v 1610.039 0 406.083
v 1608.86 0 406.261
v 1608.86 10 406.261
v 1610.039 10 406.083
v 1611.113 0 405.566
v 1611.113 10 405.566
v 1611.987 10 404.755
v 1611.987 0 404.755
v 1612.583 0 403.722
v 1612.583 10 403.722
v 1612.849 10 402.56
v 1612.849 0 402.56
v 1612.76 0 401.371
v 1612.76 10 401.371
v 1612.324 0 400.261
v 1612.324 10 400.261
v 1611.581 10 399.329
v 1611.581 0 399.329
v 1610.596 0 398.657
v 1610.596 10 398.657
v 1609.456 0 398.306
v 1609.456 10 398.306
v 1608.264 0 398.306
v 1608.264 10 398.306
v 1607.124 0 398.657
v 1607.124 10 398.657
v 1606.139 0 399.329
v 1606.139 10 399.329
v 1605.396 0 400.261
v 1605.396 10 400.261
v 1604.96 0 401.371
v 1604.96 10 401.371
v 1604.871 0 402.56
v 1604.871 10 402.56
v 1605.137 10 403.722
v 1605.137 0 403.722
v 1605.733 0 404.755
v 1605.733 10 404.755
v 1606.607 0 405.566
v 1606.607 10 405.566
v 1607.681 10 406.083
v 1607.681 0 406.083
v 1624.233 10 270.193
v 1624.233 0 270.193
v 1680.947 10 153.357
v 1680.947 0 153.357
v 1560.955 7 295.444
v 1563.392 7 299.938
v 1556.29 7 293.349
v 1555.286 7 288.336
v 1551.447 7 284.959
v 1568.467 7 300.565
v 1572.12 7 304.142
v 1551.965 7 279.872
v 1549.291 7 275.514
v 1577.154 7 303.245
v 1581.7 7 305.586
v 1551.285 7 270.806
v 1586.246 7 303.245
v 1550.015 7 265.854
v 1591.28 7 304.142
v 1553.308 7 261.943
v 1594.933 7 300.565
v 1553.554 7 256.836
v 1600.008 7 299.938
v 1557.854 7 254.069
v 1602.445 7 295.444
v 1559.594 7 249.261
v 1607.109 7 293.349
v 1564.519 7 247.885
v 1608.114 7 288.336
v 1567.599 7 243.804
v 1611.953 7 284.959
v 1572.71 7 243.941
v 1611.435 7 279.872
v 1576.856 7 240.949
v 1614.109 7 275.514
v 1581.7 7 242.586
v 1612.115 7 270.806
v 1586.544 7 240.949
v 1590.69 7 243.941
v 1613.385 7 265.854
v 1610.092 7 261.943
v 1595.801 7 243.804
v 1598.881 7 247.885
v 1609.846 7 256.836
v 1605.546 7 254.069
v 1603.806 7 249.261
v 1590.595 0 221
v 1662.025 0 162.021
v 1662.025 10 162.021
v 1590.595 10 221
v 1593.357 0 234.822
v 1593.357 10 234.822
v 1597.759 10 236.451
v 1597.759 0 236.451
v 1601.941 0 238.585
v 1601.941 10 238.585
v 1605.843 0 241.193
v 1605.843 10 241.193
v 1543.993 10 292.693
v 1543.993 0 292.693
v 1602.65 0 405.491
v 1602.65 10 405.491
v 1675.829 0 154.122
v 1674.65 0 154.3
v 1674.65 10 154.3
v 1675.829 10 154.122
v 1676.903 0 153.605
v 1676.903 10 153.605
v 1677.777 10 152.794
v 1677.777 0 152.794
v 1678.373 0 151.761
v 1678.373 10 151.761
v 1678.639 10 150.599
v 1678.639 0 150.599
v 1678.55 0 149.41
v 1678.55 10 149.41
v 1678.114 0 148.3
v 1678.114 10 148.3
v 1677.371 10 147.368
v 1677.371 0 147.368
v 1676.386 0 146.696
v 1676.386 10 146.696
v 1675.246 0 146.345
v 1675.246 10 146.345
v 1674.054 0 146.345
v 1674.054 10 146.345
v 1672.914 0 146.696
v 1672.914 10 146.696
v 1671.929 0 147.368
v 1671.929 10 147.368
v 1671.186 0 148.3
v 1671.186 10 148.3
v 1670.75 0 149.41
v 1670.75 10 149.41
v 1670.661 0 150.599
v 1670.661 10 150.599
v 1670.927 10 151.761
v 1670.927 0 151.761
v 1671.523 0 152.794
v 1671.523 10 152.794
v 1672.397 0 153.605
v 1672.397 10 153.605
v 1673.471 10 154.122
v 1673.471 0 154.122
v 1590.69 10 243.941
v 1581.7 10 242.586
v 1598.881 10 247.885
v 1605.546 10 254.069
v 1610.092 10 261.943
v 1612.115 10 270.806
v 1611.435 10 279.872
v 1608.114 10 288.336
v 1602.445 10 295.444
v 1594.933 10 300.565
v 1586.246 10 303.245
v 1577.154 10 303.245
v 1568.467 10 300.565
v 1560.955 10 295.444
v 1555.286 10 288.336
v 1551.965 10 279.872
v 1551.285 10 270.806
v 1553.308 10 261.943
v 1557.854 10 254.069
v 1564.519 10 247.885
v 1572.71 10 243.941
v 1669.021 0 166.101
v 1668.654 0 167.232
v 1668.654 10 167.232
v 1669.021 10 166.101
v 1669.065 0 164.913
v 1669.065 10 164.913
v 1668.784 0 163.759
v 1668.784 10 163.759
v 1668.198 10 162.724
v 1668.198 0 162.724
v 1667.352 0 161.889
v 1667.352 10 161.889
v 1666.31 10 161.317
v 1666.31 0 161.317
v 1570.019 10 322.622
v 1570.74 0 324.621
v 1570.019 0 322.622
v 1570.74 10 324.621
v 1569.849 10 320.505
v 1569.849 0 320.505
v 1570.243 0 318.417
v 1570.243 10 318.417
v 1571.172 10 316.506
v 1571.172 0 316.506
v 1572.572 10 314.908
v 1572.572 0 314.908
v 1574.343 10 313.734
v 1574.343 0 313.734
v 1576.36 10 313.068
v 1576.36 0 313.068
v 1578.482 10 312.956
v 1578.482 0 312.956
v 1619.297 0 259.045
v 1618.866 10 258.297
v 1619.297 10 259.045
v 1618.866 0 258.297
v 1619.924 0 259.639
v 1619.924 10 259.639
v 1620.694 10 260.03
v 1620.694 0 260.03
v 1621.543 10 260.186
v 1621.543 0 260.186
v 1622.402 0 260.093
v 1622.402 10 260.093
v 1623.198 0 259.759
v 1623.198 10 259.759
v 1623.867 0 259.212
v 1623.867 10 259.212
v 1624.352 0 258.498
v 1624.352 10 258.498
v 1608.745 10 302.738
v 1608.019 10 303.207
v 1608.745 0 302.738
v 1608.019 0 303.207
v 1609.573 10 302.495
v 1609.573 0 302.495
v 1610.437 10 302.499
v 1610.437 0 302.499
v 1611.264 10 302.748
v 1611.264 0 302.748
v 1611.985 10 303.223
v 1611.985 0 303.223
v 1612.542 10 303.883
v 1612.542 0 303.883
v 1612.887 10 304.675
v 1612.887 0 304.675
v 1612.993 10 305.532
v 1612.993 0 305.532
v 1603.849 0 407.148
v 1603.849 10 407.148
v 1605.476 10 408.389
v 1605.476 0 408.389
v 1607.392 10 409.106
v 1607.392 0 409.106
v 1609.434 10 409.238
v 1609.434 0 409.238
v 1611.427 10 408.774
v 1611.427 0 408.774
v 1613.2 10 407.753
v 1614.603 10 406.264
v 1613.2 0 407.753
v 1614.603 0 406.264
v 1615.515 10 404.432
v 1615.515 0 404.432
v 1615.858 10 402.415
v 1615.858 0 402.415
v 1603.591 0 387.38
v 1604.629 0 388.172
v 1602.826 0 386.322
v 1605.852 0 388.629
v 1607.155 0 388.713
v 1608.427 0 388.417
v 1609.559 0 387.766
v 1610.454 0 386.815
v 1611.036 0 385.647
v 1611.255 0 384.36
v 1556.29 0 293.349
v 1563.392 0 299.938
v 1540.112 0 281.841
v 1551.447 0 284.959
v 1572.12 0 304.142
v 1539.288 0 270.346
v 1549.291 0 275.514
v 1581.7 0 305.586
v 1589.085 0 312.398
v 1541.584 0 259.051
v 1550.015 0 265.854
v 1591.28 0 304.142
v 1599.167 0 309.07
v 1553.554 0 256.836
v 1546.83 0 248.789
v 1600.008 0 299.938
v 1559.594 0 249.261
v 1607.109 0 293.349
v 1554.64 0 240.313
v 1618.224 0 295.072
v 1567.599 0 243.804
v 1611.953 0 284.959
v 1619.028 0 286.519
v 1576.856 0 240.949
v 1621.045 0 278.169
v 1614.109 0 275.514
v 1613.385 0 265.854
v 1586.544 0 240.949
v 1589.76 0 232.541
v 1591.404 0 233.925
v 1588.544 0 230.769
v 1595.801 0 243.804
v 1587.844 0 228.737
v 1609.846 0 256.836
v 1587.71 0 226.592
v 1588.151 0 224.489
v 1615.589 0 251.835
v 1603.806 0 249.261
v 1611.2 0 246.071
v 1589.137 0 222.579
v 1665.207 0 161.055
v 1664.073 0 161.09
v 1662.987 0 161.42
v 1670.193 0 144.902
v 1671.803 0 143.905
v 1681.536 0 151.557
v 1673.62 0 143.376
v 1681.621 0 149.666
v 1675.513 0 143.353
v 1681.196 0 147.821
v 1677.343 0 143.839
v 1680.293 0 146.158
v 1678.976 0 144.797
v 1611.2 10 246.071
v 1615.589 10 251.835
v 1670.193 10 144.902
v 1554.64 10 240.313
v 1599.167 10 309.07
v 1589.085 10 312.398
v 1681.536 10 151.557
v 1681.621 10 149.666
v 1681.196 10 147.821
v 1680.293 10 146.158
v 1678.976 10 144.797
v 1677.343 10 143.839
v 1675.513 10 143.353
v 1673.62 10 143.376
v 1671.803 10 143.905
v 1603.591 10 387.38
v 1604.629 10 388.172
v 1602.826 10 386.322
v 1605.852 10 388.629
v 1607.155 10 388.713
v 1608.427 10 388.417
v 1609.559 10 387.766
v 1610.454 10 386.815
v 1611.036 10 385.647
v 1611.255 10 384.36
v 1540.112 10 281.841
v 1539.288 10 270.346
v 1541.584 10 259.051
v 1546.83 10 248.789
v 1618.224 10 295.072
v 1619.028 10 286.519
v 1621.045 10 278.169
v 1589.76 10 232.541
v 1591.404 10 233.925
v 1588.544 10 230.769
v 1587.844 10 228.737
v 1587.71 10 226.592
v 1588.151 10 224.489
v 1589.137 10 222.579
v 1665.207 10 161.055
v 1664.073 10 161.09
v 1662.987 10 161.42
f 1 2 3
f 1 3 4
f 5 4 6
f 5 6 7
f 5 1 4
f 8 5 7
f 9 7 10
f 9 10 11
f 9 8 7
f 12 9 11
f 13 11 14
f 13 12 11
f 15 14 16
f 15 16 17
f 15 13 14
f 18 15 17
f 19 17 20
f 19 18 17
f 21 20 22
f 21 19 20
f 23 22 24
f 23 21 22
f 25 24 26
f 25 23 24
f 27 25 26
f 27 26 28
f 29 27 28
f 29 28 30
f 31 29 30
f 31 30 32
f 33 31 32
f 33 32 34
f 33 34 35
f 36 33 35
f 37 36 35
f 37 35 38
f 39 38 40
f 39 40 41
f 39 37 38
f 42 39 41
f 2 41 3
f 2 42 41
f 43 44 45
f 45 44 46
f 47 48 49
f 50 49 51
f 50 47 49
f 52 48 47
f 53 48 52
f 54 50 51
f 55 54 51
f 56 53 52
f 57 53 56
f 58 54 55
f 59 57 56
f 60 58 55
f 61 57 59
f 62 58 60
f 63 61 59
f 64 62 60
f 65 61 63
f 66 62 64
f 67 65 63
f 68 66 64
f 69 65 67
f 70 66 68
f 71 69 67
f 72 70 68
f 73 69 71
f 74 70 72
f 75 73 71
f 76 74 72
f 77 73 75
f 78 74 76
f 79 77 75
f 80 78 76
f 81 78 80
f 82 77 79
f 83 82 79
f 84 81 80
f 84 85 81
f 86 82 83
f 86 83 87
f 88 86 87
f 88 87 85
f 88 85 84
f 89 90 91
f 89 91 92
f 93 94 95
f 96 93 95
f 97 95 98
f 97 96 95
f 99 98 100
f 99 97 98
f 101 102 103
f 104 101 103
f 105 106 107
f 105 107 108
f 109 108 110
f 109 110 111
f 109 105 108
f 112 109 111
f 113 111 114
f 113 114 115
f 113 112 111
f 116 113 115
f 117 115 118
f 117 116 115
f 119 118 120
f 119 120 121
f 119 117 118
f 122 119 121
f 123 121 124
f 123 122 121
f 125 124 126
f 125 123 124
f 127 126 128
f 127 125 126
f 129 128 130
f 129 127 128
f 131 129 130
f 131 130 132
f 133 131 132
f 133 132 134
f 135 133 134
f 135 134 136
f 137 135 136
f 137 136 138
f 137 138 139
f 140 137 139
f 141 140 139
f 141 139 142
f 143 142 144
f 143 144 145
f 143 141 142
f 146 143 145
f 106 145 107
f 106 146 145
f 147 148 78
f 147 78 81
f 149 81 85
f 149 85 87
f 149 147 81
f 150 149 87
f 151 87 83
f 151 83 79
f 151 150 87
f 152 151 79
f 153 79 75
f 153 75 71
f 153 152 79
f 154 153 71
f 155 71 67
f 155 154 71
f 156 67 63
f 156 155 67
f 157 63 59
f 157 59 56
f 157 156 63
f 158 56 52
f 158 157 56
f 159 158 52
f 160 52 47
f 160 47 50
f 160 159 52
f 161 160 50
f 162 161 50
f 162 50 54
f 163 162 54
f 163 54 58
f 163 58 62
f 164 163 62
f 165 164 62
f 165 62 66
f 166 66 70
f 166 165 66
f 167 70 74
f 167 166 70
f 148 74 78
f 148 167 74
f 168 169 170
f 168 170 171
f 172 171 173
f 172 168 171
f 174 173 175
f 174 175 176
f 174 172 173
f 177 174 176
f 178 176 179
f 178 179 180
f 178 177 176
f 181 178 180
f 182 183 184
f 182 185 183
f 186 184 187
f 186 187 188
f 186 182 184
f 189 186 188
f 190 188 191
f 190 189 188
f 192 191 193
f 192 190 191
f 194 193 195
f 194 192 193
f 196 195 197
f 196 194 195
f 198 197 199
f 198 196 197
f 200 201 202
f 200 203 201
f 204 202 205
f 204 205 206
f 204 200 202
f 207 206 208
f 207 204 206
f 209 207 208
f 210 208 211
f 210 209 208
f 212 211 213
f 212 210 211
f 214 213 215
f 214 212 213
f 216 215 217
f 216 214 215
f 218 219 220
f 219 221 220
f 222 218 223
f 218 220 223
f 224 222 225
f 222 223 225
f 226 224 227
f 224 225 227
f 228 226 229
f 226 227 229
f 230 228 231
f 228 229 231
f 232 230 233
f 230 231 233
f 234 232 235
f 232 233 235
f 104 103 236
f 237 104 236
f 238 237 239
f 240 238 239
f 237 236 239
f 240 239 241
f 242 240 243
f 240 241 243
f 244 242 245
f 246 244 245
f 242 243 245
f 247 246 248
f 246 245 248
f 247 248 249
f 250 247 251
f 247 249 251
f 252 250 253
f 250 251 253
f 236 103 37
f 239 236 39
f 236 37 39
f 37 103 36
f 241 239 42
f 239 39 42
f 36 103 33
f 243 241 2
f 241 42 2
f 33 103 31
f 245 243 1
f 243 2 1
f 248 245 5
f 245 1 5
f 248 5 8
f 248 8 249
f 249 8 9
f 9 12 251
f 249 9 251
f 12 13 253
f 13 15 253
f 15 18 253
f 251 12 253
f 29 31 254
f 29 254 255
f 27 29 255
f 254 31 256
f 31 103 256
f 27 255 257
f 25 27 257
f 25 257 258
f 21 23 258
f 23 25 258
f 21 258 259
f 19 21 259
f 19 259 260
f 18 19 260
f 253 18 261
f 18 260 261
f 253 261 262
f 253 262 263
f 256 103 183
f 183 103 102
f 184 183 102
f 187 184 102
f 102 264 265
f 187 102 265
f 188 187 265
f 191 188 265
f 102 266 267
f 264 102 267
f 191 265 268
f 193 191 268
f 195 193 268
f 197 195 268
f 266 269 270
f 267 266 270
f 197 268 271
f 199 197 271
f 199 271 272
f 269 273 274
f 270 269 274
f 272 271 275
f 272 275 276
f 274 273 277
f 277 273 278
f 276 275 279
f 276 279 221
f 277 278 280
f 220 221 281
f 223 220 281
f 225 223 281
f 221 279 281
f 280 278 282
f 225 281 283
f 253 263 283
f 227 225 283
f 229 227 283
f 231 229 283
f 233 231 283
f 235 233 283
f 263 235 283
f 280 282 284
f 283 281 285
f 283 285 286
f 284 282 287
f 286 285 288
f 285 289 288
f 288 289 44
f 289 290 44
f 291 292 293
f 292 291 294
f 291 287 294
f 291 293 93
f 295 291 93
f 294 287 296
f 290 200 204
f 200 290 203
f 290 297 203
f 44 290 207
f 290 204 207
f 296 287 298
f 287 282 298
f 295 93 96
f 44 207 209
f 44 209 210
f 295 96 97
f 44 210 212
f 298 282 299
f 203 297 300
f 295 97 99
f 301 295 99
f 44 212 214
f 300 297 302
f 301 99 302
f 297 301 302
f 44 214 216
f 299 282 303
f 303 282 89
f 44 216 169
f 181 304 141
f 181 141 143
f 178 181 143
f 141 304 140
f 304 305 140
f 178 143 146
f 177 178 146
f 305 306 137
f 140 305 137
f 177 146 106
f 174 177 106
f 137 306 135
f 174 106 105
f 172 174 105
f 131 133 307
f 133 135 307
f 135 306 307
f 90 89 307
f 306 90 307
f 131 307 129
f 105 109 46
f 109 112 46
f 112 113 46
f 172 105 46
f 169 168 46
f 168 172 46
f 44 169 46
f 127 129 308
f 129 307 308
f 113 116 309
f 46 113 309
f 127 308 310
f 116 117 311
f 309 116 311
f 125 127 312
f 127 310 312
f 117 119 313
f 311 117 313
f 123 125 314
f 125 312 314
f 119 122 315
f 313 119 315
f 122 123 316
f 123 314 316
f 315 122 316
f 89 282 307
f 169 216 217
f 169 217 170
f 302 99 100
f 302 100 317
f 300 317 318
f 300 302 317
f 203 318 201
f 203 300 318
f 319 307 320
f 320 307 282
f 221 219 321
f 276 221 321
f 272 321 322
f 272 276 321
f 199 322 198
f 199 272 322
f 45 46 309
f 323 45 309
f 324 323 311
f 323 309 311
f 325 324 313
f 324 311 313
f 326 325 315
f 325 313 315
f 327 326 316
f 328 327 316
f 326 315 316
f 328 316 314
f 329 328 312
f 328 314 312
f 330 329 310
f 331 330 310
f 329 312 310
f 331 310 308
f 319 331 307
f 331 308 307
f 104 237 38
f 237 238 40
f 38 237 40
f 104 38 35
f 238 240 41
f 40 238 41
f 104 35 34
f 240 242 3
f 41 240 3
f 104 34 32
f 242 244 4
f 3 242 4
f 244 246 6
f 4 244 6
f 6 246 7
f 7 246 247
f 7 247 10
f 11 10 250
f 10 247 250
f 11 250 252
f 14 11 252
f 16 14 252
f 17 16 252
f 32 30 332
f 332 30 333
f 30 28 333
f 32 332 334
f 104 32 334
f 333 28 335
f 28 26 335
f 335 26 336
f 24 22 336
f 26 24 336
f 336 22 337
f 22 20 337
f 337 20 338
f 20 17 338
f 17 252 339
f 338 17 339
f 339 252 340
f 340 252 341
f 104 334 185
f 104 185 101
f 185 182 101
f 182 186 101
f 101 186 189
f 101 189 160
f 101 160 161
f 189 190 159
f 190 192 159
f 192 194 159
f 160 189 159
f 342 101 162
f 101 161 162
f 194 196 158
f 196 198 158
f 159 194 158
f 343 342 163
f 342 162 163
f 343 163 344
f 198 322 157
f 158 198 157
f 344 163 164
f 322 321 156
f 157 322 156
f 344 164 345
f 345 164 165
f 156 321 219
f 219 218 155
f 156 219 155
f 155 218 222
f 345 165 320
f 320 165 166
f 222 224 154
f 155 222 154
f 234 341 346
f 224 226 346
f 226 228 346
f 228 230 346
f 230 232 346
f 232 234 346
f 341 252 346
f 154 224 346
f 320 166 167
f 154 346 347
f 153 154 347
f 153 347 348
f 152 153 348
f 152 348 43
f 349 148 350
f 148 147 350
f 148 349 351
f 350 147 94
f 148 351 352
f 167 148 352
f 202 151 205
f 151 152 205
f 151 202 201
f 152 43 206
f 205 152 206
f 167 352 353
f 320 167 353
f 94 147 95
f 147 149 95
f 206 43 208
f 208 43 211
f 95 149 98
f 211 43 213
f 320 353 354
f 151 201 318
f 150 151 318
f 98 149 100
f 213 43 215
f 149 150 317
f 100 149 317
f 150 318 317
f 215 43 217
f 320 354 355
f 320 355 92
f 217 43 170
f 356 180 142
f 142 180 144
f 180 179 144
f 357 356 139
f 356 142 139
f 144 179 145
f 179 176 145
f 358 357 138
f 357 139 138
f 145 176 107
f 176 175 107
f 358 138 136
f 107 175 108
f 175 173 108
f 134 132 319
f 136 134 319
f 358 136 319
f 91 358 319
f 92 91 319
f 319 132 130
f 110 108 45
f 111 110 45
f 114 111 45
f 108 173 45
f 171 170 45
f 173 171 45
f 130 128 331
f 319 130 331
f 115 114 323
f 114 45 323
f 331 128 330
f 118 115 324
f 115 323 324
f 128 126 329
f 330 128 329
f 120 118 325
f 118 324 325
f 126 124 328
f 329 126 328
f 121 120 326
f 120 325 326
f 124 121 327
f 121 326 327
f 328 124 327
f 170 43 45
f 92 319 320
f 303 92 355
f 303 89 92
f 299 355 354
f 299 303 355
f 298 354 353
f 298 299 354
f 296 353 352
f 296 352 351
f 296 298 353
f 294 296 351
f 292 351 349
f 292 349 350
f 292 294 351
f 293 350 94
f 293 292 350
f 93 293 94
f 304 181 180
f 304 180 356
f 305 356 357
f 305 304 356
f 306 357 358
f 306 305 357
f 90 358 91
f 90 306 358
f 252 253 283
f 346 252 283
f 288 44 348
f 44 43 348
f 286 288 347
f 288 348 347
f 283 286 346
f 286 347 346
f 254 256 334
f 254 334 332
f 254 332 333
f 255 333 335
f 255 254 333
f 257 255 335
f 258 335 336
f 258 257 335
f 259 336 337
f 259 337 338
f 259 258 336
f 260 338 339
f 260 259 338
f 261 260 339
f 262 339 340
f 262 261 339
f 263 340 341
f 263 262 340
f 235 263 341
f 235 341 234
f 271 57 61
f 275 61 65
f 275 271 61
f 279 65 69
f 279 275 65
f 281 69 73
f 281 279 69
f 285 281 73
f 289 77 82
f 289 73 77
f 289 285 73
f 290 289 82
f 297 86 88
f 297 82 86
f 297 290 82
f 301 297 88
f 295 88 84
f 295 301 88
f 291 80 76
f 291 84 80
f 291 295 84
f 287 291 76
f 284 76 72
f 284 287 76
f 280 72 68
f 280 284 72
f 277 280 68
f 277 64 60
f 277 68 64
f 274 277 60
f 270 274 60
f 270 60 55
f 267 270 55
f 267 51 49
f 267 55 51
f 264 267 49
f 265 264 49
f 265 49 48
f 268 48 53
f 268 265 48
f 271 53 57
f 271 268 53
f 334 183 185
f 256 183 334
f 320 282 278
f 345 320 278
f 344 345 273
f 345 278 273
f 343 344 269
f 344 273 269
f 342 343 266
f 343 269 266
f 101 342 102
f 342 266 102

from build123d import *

# Parameters (mm, degrees)
SZKIC2_R                    = 4
SZKIC2_R_2                  = 32.5
DODANIE_WYCI_GNI_CIE1_DEPTH = 10
WYTNIJ_WYCI_GNI_CIE1_DEPTH  = 4
WYTNIJ_WYCI_GNI_CIE2_START  = -10
WYTNIJ_WYCI_GNI_CIE2_DEPTH  = 1741.763240958
DODANIE_WYCI_GNI_CIE2_START = -7
SZKIC4_R                    = 32.5
SZKIC4_R_2                  = 30.5
DODANIE_WYCI_GNI_CIE2_DEPTH = 3
ZAOKR_GLENIE1_R             = 60
ZAOKR_GLENIE2_R             = 8
ZAOKR_GLENIE3_R             = 3


with BuildPart() as part:
    # Szkic2 → Dodanie-wyci_gni_cie1 (new body)
    with BuildSketch(Plane(origin=(0, 0, 0), x_dir=(1, 0, 0), z_dir=(0, 1, 0))):
        with BuildLine():
            Line((1543.993451292, -292.693431604), (1602.649516269, -405.490665796))
            ThreePointArc((1602.649516269, -405.490665796), (1610.447293462, -409.078792342), (1615.858300195, -402.415385751))
            Line((1615.858300195, -402.415385751), (1618.512976907, -281.976412469))
            Line((1618.512976907, -281.976412469), (1680.947289281, -153.356819868))
            ThreePointArc((1680.947289281, -153.356819868), (1678.976293723, -144.796984225), (1670.19309755, -144.902220776))
            Line((1670.19309755, -144.902220776), (1554.640194786, -240.313313752))
            ThreePointArc((1554.640194786, -240.313313752), (1540.051589656, -264.620128285), (1543.993451292, -292.693431604))
        make_face()
        with Locations((1608.86, -402.261131492)):
            Circle(SZKIC2_R, mode=Mode.SUBTRACT)
        with Locations((1581.69995966, -273.085544755)):
            Circle(SZKIC2_R_2, mode=Mode.SUBTRACT)
        with Locations((1674.65, -150.3)):
            Circle(SZKIC2_R, mode=Mode.SUBTRACT)
    extrude(amount=DODANIE_WYCI_GNI_CIE1_DEPTH)

    # Szkic3 → Wytnij-wyci_gni_cie1 (cut)
    with BuildSketch(Plane(origin=(0, 10, 0), x_dir=(1, 0, 0), z_dir=(0, 1, 0))):
        with BuildLine():
            Line((1562.06257658, -307.933402448), (1602.825740378, -386.322093118))
            ThreePointArc((1602.825740378, -386.322093118), (1607.801974735, -388.611894192), (1611.255066167, -384.359570486))
            Line((1611.255066167, -384.359570486), (1613.16331738, -297.784879179))
            ThreePointArc((1613.16331738, -297.784879179), (1589.491721347, -312.31931146), (1562.06257658, -307.933402448))
        make_face()
        with BuildLine():
            Line((1662.025493572, -162.020782011), (1575.342850703, -233.593935954))
            ThreePointArc((1575.342850703, -233.593935954), (1604.608184708, -240.295100641), (1620.968093066, -265.468872331))
            Line((1620.968093066, -265.468872331), (1668.654089364, -167.231970482))
            ThreePointArc((1668.654089364, -167.231970482), (1667.439220484, -161.955917019), (1662.025493572, -162.020782011))
        make_face()
    extrude(amount=-WYTNIJ_WYCI_GNI_CIE1_DEPTH, mode=Mode.SUBTRACT)

    # Szkic3_3 → Wytnij-wyci_gni_cie2 (cut, through all)
    with BuildSketch(Plane(origin=(0, 10, 0), x_dir=(1, 0, 0), z_dir=(0, 1, 0)).offset(WYTNIJ_WYCI_GNI_CIE2_START)):
        with BuildLine():
            Line((1562.06257658, -307.933402448), (1602.825740378, -386.322093118))
            ThreePointArc((1602.825740378, -386.322093118), (1607.801974735, -388.611894192), (1611.255066167, -384.359570486))
            Line((1611.255066167, -384.359570486), (1613.16331738, -297.784879179))
            ThreePointArc((1613.16331738, -297.784879179), (1589.491721347, -312.31931146), (1562.06257658, -307.933402448))
        make_face()
        with BuildLine():
            Line((1662.025493572, -162.020782011), (1575.342850703, -233.593935954))
            ThreePointArc((1575.342850703, -233.593935954), (1604.608184708, -240.295100641), (1620.968093066, -265.468872331))
            Line((1620.968093066, -265.468872331), (1668.654089364, -167.231970482))
            ThreePointArc((1668.654089364, -167.231970482), (1667.439220484, -161.955917019), (1662.025493572, -162.020782011))
        make_face()
    extrude(amount=WYTNIJ_WYCI_GNI_CIE2_DEPTH, mode=Mode.SUBTRACT)

    # Szkic4 → Dodanie-wyci_gni_cie2 (add)
    with BuildSketch(Plane(origin=(0, 0, 0), x_dir=(-1, 0, 0), z_dir=(0, -1, 0)).offset(DODANIE_WYCI_GNI_CIE2_START)):
        with Locations((-1581.69995966, -273.085544755)):
            Circle(SZKIC4_R)
        with Locations((-1581.69995966, -273.085544755)):
            Circle(SZKIC4_R_2, mode=Mode.SUBTRACT)
    extrude(amount=-DODANIE_WYCI_GNI_CIE2_DEPTH)

    # Zaokr_glenie1
    zaokr_glenie1_edges = [part.edges().sort_by_distance(p)[0] for p in [
        (1618.512976907, 5, 281.976412469),
    ]]
    fillet(zaokr_glenie1_edges, radius=ZAOKR_GLENIE1_R)

    # Zaokr_glenie2
    zaokr_glenie2_edges = [part.edges().sort_by_distance(p)[0] for p in [
        (1562.06257658, 5, 307.933402448),
        (1575.342850703, 5, 233.593935954),
    ]]
    fillet(zaokr_glenie2_edges, radius=ZAOKR_GLENIE2_R)

    # Zaokr_glenie3
    zaokr_glenie3_edges = [part.edges().sort_by_distance(p)[0] for p in [
        (1613.16331738, 5, 297.784879179),
        (1620.968093066, 5, 265.468872331),
    ]]
    fillet(zaokr_glenie3_edges, radius=ZAOKR_GLENIE3_R)


solid = part.part
